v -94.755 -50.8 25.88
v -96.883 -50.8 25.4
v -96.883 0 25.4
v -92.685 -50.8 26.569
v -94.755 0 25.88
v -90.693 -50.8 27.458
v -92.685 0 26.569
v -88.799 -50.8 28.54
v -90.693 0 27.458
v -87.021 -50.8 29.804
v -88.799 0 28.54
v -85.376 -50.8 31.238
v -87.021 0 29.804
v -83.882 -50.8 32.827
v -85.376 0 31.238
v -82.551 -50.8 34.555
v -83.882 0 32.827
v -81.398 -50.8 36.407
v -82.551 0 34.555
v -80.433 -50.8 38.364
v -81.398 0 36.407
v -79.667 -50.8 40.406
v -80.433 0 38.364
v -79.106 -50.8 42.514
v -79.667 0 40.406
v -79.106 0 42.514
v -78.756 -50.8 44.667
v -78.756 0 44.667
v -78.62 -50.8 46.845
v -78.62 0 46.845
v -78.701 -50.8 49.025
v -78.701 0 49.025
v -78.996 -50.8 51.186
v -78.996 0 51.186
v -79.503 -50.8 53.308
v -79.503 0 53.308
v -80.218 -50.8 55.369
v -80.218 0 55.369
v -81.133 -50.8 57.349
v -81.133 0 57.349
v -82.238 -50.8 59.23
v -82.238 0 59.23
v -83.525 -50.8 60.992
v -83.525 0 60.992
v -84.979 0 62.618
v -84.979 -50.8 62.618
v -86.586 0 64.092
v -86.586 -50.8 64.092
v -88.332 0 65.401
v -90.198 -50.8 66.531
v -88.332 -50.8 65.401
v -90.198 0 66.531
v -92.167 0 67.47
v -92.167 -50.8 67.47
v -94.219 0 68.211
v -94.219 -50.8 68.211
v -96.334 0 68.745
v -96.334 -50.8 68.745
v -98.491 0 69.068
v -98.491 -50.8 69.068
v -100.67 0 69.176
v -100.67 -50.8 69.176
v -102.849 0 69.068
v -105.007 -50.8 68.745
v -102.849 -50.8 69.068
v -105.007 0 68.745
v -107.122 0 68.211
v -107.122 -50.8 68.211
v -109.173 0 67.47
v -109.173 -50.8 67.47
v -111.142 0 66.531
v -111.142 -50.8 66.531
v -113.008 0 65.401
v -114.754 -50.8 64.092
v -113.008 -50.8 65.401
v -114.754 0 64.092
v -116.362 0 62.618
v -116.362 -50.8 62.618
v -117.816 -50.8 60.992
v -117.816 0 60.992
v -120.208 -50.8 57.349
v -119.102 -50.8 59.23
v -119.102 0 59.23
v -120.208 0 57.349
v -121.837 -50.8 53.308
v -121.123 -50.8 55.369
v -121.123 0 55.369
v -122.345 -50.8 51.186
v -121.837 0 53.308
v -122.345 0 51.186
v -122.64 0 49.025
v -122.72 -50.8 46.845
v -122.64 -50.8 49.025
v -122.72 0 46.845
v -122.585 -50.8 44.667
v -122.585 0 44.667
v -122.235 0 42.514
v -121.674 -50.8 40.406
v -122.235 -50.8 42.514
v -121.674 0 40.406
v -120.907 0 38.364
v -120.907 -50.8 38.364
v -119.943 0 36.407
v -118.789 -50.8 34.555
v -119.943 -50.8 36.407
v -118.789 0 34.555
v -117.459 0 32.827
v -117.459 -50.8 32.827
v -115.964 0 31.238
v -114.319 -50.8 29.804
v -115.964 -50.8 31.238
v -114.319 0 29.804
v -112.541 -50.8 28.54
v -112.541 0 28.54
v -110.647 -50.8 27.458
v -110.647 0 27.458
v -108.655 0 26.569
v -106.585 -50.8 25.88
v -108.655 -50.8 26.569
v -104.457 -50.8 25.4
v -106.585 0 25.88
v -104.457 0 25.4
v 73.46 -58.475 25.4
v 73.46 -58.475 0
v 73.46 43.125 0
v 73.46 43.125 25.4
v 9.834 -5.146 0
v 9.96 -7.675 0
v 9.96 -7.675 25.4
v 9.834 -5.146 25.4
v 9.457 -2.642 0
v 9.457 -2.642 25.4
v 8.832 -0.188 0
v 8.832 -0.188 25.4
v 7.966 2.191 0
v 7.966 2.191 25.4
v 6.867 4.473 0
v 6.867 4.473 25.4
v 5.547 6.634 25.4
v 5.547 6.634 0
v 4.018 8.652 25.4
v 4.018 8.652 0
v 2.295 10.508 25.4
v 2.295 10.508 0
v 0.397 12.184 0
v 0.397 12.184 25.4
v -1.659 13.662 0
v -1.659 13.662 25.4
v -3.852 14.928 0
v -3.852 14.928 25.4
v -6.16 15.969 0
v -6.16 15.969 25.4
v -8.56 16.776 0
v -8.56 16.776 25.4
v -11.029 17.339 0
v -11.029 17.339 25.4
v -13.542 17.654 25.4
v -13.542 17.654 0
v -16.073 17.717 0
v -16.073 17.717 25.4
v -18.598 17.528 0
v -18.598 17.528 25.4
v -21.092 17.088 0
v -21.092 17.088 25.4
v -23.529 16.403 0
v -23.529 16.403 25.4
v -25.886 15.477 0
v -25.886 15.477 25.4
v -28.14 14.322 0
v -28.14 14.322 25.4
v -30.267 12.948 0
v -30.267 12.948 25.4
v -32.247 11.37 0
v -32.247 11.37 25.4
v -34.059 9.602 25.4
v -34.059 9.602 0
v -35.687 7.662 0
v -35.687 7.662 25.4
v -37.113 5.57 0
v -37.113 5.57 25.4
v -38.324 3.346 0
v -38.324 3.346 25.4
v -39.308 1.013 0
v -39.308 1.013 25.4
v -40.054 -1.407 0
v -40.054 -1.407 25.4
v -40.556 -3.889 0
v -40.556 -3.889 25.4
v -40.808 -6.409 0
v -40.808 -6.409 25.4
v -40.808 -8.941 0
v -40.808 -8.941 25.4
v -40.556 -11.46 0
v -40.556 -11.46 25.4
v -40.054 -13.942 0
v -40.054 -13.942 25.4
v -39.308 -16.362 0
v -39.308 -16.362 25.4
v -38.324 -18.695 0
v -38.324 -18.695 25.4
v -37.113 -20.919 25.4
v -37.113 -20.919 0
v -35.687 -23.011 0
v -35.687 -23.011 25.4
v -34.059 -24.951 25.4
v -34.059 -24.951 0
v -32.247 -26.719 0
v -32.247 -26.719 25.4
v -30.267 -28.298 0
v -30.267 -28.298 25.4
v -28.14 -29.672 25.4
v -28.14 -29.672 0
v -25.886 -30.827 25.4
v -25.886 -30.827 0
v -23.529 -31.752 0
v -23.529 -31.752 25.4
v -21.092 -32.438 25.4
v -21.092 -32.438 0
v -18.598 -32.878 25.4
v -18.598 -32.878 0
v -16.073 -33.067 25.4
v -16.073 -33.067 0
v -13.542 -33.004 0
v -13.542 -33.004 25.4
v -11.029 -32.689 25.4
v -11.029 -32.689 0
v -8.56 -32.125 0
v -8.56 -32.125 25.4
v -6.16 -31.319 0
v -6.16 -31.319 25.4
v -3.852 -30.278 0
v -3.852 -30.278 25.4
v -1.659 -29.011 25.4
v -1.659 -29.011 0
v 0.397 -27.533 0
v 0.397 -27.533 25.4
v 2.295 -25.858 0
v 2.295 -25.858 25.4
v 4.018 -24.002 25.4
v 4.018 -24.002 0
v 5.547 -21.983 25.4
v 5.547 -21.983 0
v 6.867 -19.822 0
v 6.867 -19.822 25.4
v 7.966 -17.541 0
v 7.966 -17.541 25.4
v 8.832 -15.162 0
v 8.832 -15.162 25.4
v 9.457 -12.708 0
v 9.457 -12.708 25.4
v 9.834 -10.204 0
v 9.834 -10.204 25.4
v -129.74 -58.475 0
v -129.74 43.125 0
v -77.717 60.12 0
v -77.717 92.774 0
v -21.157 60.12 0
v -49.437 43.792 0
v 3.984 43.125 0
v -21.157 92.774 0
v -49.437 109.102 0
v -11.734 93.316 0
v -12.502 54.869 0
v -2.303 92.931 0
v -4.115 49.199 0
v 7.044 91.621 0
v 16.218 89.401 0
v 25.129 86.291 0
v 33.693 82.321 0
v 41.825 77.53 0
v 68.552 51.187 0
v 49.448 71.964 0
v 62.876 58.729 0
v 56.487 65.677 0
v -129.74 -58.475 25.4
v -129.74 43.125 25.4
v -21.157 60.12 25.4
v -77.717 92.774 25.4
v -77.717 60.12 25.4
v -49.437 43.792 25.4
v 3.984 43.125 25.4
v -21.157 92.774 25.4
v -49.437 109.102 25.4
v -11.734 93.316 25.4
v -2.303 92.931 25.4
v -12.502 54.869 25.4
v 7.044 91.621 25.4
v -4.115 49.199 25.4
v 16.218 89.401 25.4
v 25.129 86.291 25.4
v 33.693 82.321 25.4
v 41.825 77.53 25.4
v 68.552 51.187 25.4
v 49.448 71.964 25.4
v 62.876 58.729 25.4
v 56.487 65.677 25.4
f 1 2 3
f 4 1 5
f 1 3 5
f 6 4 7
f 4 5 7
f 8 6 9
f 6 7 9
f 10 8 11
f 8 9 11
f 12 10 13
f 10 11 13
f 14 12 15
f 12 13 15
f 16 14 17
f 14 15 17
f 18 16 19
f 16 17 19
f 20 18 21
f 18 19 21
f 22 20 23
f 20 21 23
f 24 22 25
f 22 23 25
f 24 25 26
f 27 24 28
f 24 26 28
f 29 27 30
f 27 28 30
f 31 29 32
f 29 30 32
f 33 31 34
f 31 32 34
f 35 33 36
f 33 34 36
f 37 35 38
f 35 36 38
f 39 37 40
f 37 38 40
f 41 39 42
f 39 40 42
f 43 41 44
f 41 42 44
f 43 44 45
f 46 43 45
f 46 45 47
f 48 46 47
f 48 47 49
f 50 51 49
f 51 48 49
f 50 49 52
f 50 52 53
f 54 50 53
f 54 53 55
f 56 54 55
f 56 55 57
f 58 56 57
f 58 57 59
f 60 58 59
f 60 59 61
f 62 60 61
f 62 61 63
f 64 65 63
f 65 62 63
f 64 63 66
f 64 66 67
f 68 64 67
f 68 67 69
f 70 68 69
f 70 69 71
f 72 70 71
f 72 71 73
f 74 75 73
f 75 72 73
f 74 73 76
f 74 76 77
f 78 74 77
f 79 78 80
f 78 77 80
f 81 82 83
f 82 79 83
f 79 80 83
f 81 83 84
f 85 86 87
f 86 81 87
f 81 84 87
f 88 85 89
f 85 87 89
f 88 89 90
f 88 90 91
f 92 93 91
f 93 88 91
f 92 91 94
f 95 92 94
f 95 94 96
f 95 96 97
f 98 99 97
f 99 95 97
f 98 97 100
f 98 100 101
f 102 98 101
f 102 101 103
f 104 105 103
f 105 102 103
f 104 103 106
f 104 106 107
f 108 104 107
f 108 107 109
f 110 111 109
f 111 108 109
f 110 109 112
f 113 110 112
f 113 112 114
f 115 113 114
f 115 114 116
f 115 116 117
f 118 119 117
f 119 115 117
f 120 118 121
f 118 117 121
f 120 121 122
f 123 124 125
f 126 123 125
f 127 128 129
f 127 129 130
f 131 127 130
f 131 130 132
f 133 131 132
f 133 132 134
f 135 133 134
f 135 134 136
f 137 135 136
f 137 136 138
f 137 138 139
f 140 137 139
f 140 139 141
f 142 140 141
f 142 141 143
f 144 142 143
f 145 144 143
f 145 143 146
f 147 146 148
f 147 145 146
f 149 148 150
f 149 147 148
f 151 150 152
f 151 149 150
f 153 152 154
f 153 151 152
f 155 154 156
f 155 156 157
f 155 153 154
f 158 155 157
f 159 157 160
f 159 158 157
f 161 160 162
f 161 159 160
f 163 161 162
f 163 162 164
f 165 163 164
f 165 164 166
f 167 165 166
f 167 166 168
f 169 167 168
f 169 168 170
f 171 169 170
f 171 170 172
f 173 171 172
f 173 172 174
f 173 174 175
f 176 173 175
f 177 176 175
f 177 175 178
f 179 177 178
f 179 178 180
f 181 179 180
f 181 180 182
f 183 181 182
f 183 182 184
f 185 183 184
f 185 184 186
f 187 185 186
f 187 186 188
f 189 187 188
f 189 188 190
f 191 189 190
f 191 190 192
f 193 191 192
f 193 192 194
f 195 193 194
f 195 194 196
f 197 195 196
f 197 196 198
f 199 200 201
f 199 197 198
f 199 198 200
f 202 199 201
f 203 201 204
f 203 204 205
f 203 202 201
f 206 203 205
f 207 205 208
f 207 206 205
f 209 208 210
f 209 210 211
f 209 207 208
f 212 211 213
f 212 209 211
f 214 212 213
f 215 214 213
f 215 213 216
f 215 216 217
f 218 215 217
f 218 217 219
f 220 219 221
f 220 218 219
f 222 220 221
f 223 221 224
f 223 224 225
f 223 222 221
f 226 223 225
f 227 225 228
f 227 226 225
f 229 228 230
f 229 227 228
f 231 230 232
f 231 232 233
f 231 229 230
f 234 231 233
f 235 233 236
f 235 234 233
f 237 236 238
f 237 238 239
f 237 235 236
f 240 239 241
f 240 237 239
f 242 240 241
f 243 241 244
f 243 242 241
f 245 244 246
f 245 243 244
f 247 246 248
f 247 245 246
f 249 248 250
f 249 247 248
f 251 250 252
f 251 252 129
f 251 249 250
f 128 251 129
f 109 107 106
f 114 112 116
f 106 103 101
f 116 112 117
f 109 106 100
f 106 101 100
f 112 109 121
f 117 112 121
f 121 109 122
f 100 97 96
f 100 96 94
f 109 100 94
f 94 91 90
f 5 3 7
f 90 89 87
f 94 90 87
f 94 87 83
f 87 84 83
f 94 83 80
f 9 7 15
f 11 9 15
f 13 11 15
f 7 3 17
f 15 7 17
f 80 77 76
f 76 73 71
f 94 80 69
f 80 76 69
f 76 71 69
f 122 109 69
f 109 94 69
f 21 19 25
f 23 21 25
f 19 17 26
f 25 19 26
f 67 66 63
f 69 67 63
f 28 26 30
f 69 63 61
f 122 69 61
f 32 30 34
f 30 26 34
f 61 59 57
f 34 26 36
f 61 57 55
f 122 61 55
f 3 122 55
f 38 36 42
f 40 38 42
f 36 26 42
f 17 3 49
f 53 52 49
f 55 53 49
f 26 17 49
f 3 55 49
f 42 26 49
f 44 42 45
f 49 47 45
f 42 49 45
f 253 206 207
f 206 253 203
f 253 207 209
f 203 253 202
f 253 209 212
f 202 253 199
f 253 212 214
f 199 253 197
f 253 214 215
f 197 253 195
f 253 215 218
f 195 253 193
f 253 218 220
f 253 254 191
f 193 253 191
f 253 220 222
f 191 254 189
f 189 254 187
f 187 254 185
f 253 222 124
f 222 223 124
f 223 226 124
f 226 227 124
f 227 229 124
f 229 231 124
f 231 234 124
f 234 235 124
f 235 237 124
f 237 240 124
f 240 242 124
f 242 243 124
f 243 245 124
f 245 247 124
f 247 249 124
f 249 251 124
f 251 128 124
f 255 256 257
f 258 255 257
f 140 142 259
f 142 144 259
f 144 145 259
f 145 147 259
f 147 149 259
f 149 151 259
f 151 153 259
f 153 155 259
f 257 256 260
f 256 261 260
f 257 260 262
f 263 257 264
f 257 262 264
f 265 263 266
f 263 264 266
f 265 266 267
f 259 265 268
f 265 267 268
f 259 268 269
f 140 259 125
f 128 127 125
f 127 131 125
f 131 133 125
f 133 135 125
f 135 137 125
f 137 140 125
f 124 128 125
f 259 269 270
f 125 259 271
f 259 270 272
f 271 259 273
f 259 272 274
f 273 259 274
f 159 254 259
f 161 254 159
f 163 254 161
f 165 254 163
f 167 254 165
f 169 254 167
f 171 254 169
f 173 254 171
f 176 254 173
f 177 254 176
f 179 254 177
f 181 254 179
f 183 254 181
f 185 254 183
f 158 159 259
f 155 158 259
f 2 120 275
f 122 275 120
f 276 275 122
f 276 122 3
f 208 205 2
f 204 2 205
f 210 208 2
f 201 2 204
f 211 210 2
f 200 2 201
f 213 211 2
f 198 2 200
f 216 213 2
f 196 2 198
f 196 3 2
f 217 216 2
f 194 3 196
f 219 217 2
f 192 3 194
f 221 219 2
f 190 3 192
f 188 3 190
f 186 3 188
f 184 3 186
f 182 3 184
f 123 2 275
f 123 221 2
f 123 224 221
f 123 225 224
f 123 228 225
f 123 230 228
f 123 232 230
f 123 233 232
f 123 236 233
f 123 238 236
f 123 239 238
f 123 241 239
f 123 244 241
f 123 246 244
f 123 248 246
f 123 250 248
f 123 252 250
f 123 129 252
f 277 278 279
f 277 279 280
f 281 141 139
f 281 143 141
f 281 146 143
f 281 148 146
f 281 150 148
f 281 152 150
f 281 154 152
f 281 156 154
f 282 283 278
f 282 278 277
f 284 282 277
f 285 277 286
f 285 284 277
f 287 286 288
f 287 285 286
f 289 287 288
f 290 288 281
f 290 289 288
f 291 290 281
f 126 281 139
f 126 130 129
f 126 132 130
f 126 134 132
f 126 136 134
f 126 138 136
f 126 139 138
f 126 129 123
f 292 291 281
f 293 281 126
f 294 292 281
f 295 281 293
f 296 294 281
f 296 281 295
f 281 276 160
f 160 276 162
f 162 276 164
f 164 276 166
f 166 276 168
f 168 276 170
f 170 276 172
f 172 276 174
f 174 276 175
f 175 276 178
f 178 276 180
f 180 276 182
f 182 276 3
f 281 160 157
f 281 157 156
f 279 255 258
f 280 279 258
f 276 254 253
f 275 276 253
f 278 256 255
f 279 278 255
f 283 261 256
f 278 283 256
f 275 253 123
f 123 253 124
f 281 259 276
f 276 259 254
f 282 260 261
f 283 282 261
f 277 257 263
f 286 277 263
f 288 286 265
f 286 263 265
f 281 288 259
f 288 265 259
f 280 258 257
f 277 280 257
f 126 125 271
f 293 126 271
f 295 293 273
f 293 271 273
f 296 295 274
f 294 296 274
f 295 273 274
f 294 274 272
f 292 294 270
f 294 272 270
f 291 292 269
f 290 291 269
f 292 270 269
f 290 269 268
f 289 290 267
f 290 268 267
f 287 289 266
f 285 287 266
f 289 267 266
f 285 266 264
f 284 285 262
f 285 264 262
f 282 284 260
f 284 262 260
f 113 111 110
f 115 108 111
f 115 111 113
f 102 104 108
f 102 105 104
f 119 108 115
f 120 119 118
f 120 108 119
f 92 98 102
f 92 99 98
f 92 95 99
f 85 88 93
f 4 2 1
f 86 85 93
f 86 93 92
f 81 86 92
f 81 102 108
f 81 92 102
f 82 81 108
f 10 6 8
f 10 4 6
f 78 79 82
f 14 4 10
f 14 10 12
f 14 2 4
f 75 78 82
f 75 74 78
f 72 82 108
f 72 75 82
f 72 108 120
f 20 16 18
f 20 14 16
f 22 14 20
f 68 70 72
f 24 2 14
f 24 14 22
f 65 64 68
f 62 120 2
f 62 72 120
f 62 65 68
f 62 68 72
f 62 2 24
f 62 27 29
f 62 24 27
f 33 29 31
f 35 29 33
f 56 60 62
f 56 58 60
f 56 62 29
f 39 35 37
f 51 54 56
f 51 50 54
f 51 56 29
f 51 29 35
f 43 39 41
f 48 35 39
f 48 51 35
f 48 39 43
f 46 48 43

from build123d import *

# Parameters (mm, degrees)
F0_R     = 25.4
F1_DEPTH = 12.7
F2_DEPTH = 25.4
F3_R     = 22.051706
F4_DEPTH = 50.8


with BuildPart() as f1:
    # F0 (on Top) → F1 (new body)
    with BuildSketch(Plane.XY):
        with BuildLine():
            Line((3.983806, 43.125236), (-129.739803, 43.125236))
            Line((-129.739803, 43.125236), (-129.739803, -7.674764))
            Line((-129.739803, -7.674764), (-129.739803, -58.474764))
            Line((-129.739803, -58.474764), (-15.439803, -58.474764))
            Line((-15.439803, -58.474764), (73.460197, -58.474764))
            ThreePointArc((73.460197, -58.474764), (46.476896, -2.371791), (3.983806, 43.125236))
        make_face()
        with Locations((-15.439803, -7.674764)):
            Circle(F0_R, mode=Mode.SUBTRACT)
        with BuildLine():
            ThreePointArc((-21.157369, 60.119772), (-8.273827, 52.085478), (3.983806, 43.125236))
            Line((3.983806, 43.125236), (73.460197, 43.125236))
            ThreePointArc((73.460197, 43.125236), (33.692598, 82.321217), (-21.157369, 92.774352))
            Line((-21.157369, 92.774352), (-21.157369, 60.119772))
        make_face()
        with BuildLine():
            Line((73.460197, 43.125236), (3.983806, 43.125236))
            ThreePointArc((3.983806, 43.125236), (46.476896, -2.371791), (73.460197, -58.474764))
            Line((73.460197, -58.474764), (73.460197, 43.125236))
        make_face()
        Polygon((-49.437065, 43.792482), (-21.157369, 60.119772), (-21.157369, 92.774352), (-49.437065, 109.101642), (-77.71676, 92.774352), (-77.71676, 60.119772), align=None)
    extrude(amount=F1_DEPTH)

    # F0 (on Top) → F2 (join)
    with BuildSketch(Plane.XY):
        with BuildLine():
            Line((3.983806, 43.125236), (-129.739803, 43.125236))
            Line((-129.739803, 43.125236), (-129.739803, -7.674764))
            Line((-129.739803, -7.674764), (-129.739803, -58.474764))
            Line((-129.739803, -58.474764), (-15.439803, -58.474764))
            Line((-15.439803, -58.474764), (73.460197, -58.474764))
            ThreePointArc((73.460197, -58.474764), (46.476896, -2.371791), (3.983806, 43.125236))
        make_face()
        with Locations((-15.439803, -7.674764)):
            Circle(F0_R, mode=Mode.SUBTRACT)
        with BuildLine():
            ThreePointArc((-21.157369, 60.119772), (-8.273827, 52.085478), (3.983806, 43.125236))
            Line((3.983806, 43.125236), (73.460197, 43.125236))
            ThreePointArc((73.460197, 43.125236), (33.692598, 82.321217), (-21.157369, 92.774352))
            Line((-21.157369, 92.774352), (-21.157369, 60.119772))
        make_face()
        with BuildLine():
            Line((73.460197, 43.125236), (3.983806, 43.125236))
            ThreePointArc((3.983806, 43.125236), (46.476896, -2.371791), (73.460197, -58.474764))
            Line((73.460197, -58.474764), (73.460197, 43.125236))
        make_face()
        Polygon((-49.437065, 43.792482), (-21.157369, 60.119772), (-21.157369, 92.774352), (-49.437065, 109.101642), (-77.71676, 92.774352), (-77.71676, 60.119772), align=None)
    extrude(amount=F2_DEPTH)

    # F3 (on Front) → F4 (join)
    with BuildSketch(Plane.XZ):
        with Locations((-100.670184, 47.124073)):
            Circle(F3_R)
    extrude(amount=F4_DEPTH)


solid = f1.part
